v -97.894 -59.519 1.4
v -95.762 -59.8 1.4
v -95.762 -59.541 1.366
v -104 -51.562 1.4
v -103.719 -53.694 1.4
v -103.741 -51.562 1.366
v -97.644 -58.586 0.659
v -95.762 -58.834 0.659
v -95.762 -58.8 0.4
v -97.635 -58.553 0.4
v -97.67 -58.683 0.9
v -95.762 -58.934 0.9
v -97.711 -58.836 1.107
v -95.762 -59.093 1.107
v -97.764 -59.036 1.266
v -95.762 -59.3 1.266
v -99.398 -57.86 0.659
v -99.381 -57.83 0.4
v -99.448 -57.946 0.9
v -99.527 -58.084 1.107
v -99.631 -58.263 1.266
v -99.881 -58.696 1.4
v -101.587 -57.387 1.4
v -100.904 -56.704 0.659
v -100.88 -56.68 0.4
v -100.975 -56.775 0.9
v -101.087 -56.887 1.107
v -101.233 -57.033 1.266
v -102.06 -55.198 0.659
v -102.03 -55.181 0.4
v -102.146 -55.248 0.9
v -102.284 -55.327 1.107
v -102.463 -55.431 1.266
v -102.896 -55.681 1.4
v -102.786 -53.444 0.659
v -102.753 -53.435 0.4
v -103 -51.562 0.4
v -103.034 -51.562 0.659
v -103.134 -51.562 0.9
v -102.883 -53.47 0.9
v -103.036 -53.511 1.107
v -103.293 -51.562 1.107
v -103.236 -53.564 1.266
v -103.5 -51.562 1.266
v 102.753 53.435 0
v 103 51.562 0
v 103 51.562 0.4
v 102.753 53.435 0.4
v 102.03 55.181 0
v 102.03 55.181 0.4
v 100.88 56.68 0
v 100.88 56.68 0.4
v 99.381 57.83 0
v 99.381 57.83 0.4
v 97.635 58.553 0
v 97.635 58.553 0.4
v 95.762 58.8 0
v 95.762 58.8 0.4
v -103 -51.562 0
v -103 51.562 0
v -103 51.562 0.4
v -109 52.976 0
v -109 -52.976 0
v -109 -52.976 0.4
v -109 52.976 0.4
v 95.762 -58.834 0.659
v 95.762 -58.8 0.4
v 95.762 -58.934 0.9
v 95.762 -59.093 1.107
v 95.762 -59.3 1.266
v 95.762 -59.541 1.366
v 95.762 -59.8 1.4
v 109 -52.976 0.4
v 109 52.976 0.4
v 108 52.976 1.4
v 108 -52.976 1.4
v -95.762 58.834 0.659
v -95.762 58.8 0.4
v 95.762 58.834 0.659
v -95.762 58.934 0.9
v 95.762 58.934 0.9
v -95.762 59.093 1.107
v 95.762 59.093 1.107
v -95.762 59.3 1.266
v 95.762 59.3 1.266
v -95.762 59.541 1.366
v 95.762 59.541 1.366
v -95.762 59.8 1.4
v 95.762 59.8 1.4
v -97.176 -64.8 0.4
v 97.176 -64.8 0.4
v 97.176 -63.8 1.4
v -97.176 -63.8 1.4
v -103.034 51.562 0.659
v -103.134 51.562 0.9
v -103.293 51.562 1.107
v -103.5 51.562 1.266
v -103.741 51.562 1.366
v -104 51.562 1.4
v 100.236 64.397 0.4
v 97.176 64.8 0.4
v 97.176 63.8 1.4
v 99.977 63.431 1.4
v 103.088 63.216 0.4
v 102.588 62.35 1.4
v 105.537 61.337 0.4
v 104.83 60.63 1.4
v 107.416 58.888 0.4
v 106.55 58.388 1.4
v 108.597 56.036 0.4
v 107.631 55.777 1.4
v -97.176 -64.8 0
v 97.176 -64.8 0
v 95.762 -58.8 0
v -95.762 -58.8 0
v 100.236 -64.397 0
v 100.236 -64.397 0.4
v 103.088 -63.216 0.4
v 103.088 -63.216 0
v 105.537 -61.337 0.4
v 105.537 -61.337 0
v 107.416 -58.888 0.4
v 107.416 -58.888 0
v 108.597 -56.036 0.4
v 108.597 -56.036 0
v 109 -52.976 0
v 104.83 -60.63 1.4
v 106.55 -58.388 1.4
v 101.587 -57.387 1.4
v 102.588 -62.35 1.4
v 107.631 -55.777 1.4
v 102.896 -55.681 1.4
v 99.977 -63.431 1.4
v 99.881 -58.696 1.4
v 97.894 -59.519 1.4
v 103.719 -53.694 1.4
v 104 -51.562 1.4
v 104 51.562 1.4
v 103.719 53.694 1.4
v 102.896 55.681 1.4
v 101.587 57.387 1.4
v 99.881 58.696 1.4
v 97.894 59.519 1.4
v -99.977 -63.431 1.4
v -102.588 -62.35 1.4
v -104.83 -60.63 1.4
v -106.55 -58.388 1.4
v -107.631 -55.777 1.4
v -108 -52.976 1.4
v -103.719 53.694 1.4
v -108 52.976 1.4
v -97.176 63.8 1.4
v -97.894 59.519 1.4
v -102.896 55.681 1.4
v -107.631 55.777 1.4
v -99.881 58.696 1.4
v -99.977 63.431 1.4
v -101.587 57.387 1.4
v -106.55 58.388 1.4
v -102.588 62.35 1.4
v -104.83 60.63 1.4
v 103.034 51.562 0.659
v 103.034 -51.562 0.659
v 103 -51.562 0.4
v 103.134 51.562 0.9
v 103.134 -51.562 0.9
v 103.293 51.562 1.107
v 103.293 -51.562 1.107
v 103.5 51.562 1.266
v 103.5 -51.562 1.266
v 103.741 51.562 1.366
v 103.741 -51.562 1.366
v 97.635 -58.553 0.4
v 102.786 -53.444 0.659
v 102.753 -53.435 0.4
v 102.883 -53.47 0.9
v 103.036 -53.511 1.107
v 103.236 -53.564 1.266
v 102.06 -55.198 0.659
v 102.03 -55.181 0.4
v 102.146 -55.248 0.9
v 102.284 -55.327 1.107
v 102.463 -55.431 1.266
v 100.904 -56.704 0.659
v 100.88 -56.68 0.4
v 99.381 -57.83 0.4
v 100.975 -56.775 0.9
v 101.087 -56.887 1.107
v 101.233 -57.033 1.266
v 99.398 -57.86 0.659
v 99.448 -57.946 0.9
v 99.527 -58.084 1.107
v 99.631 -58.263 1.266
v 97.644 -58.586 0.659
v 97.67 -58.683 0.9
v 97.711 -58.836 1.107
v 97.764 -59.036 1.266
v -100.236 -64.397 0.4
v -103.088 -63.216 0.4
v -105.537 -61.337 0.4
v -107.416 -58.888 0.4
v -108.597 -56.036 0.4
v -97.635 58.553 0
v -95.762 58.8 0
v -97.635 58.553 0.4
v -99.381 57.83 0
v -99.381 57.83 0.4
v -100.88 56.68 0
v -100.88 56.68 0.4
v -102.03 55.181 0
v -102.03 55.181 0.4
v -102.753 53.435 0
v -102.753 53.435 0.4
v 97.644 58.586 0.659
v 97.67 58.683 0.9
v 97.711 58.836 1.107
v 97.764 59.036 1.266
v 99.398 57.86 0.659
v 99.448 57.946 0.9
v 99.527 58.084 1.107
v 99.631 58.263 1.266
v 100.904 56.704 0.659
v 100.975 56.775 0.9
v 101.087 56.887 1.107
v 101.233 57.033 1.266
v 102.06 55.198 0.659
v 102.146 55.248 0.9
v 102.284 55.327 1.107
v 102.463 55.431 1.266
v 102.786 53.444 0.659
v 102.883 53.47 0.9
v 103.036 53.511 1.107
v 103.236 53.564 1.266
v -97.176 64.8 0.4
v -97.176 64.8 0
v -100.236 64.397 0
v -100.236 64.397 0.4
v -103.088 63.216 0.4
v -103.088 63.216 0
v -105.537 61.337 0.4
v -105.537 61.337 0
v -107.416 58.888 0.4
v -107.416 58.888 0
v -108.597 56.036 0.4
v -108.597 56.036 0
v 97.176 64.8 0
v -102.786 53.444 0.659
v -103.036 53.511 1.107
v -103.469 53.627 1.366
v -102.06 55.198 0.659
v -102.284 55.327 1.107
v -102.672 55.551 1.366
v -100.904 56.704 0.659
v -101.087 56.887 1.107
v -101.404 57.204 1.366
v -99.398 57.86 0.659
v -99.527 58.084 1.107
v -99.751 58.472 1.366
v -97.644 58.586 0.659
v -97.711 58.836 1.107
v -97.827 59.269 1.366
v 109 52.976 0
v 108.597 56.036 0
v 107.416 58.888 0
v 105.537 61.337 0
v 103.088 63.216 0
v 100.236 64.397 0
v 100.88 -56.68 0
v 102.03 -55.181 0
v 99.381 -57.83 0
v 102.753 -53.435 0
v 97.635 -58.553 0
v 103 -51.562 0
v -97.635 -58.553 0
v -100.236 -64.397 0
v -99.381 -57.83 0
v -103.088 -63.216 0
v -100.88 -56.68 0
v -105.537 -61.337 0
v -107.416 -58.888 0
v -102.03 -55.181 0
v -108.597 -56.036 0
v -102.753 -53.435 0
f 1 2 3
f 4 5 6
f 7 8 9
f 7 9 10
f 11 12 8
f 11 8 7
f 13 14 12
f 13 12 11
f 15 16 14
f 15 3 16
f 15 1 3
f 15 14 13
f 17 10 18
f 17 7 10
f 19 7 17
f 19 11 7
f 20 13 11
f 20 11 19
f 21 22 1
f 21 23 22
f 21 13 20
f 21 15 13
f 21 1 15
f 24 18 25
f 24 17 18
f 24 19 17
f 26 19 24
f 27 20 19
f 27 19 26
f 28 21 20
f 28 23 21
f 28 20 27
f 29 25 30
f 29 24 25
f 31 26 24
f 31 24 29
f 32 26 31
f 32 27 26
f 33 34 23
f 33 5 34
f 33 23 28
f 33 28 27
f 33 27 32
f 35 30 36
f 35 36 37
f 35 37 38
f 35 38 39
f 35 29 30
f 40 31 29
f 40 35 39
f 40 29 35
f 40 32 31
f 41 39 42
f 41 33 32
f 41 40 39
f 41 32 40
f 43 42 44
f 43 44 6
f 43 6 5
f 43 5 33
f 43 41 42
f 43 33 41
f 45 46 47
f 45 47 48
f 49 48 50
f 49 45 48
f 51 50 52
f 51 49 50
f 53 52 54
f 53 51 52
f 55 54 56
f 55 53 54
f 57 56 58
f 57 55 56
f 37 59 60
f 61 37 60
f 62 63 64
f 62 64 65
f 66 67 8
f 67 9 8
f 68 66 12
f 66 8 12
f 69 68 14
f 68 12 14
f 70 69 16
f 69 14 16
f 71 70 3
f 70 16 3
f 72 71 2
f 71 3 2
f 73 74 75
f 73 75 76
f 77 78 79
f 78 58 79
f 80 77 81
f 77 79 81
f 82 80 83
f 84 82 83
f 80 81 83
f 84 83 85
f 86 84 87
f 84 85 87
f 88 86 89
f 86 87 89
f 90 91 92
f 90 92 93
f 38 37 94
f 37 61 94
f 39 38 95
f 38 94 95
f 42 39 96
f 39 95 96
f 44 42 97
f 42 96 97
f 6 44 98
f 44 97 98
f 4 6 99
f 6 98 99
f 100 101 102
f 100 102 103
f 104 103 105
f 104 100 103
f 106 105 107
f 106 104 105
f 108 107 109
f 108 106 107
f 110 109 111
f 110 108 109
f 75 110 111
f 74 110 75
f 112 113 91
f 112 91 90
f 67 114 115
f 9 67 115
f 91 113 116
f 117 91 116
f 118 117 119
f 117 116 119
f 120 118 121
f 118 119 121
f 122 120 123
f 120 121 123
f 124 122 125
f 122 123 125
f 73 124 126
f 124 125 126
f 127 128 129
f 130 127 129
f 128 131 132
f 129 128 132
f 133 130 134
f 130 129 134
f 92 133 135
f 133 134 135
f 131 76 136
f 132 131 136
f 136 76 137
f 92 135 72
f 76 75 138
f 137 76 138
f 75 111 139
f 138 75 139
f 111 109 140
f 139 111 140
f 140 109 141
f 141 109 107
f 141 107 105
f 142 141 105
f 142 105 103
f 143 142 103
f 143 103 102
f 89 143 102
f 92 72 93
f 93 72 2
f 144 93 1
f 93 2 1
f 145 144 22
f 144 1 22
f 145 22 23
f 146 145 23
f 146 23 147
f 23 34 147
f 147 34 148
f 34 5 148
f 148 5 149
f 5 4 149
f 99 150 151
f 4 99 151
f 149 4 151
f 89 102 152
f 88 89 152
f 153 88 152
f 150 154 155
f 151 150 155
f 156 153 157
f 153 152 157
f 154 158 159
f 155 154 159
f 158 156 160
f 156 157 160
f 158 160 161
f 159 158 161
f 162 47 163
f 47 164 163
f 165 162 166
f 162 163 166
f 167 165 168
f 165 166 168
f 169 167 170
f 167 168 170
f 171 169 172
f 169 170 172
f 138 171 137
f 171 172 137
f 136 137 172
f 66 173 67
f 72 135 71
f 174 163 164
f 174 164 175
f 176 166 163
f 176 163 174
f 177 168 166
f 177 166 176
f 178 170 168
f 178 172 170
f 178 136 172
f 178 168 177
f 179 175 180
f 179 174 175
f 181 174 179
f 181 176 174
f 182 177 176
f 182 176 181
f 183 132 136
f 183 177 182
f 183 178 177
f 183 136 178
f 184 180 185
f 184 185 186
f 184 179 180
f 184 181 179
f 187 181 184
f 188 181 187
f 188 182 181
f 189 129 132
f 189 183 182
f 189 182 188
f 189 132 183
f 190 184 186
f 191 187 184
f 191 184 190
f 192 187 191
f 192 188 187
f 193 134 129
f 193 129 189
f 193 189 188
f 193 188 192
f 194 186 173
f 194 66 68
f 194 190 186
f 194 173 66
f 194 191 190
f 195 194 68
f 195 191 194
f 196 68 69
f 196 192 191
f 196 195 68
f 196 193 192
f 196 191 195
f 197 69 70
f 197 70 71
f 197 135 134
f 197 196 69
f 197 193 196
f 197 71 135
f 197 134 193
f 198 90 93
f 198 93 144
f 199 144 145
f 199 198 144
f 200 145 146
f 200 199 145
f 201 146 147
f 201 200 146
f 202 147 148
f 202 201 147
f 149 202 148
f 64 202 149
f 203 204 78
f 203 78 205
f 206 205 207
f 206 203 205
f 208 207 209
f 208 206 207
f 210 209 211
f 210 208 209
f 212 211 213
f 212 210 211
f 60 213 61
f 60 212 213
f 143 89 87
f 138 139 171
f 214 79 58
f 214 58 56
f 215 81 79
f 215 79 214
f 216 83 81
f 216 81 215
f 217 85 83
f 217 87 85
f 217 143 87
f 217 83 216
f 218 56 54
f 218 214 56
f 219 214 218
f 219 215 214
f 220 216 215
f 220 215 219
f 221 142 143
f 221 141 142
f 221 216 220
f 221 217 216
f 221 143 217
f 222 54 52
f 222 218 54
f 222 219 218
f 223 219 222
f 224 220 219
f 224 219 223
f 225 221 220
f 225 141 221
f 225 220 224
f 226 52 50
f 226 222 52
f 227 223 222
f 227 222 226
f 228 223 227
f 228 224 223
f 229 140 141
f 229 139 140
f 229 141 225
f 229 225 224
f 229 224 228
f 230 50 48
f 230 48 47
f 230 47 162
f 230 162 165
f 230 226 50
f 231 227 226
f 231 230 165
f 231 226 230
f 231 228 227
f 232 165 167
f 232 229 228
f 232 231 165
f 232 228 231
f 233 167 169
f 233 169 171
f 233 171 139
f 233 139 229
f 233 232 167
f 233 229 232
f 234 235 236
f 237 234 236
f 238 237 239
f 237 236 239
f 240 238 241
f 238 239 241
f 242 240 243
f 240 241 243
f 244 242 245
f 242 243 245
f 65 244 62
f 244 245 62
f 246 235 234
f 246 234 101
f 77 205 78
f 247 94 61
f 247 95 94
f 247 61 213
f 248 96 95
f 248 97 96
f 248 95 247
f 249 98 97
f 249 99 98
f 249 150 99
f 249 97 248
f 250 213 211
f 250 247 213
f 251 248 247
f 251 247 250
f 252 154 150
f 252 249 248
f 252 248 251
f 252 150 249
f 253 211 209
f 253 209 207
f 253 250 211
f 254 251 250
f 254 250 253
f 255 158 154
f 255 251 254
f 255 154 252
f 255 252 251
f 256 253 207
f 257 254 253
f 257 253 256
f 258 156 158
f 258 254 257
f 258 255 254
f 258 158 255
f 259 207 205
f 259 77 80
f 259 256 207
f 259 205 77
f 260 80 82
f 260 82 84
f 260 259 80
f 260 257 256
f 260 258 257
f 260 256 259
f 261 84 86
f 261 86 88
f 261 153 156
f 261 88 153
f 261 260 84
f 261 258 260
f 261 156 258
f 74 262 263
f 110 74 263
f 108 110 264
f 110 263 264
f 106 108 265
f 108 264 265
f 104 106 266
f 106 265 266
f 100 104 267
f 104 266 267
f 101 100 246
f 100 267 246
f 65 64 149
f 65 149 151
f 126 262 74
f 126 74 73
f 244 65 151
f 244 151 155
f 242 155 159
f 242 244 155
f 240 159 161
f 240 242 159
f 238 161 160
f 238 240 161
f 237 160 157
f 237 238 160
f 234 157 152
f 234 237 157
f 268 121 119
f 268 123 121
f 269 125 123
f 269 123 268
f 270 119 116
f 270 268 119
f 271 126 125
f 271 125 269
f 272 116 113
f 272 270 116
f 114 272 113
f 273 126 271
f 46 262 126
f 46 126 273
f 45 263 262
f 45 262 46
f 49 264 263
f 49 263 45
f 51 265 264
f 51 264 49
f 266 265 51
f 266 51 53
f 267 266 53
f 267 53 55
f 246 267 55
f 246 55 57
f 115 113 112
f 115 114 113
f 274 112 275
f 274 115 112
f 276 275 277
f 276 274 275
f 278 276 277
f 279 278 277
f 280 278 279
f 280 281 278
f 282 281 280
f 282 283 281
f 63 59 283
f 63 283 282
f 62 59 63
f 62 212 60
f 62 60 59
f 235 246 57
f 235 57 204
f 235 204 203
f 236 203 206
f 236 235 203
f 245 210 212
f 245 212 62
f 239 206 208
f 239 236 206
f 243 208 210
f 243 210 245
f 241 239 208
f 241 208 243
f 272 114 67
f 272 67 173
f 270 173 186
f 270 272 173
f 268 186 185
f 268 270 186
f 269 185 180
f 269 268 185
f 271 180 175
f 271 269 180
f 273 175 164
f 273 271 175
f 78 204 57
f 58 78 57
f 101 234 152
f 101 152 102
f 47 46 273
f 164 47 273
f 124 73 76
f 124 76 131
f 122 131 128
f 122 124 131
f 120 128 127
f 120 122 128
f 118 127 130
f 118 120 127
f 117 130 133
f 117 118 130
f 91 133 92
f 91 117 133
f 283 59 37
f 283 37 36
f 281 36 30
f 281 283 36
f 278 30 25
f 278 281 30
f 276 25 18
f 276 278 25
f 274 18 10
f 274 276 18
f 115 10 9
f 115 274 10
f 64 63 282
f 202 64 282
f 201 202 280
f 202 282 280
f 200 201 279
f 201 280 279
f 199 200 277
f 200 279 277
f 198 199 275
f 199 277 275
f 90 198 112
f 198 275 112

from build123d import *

# Parameters (mm, degrees)
PAD002_DEPTH = 1.4
FILLET_R     = 1
CHAMFER_SIZE = 1


with BuildPart() as part:
    # Sketch003 → Pad002 (new body)
    with BuildSketch(Plane.XY):
        with BuildLine():
            Line((-97.175786, 64.8), (97.175786, 64.8))
            ThreePointArc((109, 52.975786), (105.536768, 61.336768), (97.175786, 64.8))
            Line((109, 52.975786), (109, -52.975786))
            ThreePointArc((97.175786, -64.8), (105.536768, -61.336768), (109, -52.975786))
            Line((97.175786, -64.8), (-97.175786, -64.8))
            ThreePointArc((-109, -52.975786), (-105.536768, -61.336768), (-97.175786, -64.8))
            Line((-109, -52.975786), (-109, 52.975786))
            ThreePointArc((-97.175786, 64.8), (-105.536768, 61.336768), (-109, 52.975786))
        make_face()
        with BuildLine():
            Line((-95.761573, 58.8), (95.761573, 58.8))
            ThreePointArc((103, 51.561573), (100.879914, 56.679914), (95.761573, 58.8))
            Line((103, 51.561573), (103, -51.561573))
            ThreePointArc((95.761573, -58.8), (100.879914, -56.679914), (103, -51.561573))
            Line((95.761573, -58.8), (-95.761573, -58.8))
            ThreePointArc((-103, -51.561573), (-100.879914, -56.679914), (-95.761573, -58.8))
            Line((-103, -51.561573), (-103, 51.561573))
            ThreePointArc((-95.761573, 58.8), (-100.879914, 56.679914), (-103, 51.561573))
        make_face(mode=Mode.SUBTRACT)
    extrude(amount=PAD002_DEPTH)

    # Fillet
    fillet_edges = [part.edges().sort_by_distance(p)[0] for p in [
        (0, 58.8, 1.4),
        (-100.879914, 56.679914, 1.4),
        (-103, 0, 1.4),
        (-100.879914, -56.679914, 1.4),
        (0, -58.8, 1.4),
        (100.879914, -56.679914, 1.4),
        (103, 0, 1.4),
        (100.879914, 56.679914, 1.4),
    ]]
    fillet(fillet_edges, radius=FILLET_R)

    # Chamfer
    chamfer_edges = [part.edges().sort_by_distance(p)[0] for p in [
        (0, 64.8, 1.4),
        (105.536768, 61.336768, 1.4),
        (109, 0, 1.4),
        (105.536768, -61.336768, 1.4),
        (0, -64.8, 1.4),
        (-105.536768, -61.336768, 1.4),
        (-109, 0, 1.4),
        (-105.536768, 61.336768, 1.4),
    ]]
    chamfer(chamfer_edges, length=CHAMFER_SIZE)


solid = part.part
